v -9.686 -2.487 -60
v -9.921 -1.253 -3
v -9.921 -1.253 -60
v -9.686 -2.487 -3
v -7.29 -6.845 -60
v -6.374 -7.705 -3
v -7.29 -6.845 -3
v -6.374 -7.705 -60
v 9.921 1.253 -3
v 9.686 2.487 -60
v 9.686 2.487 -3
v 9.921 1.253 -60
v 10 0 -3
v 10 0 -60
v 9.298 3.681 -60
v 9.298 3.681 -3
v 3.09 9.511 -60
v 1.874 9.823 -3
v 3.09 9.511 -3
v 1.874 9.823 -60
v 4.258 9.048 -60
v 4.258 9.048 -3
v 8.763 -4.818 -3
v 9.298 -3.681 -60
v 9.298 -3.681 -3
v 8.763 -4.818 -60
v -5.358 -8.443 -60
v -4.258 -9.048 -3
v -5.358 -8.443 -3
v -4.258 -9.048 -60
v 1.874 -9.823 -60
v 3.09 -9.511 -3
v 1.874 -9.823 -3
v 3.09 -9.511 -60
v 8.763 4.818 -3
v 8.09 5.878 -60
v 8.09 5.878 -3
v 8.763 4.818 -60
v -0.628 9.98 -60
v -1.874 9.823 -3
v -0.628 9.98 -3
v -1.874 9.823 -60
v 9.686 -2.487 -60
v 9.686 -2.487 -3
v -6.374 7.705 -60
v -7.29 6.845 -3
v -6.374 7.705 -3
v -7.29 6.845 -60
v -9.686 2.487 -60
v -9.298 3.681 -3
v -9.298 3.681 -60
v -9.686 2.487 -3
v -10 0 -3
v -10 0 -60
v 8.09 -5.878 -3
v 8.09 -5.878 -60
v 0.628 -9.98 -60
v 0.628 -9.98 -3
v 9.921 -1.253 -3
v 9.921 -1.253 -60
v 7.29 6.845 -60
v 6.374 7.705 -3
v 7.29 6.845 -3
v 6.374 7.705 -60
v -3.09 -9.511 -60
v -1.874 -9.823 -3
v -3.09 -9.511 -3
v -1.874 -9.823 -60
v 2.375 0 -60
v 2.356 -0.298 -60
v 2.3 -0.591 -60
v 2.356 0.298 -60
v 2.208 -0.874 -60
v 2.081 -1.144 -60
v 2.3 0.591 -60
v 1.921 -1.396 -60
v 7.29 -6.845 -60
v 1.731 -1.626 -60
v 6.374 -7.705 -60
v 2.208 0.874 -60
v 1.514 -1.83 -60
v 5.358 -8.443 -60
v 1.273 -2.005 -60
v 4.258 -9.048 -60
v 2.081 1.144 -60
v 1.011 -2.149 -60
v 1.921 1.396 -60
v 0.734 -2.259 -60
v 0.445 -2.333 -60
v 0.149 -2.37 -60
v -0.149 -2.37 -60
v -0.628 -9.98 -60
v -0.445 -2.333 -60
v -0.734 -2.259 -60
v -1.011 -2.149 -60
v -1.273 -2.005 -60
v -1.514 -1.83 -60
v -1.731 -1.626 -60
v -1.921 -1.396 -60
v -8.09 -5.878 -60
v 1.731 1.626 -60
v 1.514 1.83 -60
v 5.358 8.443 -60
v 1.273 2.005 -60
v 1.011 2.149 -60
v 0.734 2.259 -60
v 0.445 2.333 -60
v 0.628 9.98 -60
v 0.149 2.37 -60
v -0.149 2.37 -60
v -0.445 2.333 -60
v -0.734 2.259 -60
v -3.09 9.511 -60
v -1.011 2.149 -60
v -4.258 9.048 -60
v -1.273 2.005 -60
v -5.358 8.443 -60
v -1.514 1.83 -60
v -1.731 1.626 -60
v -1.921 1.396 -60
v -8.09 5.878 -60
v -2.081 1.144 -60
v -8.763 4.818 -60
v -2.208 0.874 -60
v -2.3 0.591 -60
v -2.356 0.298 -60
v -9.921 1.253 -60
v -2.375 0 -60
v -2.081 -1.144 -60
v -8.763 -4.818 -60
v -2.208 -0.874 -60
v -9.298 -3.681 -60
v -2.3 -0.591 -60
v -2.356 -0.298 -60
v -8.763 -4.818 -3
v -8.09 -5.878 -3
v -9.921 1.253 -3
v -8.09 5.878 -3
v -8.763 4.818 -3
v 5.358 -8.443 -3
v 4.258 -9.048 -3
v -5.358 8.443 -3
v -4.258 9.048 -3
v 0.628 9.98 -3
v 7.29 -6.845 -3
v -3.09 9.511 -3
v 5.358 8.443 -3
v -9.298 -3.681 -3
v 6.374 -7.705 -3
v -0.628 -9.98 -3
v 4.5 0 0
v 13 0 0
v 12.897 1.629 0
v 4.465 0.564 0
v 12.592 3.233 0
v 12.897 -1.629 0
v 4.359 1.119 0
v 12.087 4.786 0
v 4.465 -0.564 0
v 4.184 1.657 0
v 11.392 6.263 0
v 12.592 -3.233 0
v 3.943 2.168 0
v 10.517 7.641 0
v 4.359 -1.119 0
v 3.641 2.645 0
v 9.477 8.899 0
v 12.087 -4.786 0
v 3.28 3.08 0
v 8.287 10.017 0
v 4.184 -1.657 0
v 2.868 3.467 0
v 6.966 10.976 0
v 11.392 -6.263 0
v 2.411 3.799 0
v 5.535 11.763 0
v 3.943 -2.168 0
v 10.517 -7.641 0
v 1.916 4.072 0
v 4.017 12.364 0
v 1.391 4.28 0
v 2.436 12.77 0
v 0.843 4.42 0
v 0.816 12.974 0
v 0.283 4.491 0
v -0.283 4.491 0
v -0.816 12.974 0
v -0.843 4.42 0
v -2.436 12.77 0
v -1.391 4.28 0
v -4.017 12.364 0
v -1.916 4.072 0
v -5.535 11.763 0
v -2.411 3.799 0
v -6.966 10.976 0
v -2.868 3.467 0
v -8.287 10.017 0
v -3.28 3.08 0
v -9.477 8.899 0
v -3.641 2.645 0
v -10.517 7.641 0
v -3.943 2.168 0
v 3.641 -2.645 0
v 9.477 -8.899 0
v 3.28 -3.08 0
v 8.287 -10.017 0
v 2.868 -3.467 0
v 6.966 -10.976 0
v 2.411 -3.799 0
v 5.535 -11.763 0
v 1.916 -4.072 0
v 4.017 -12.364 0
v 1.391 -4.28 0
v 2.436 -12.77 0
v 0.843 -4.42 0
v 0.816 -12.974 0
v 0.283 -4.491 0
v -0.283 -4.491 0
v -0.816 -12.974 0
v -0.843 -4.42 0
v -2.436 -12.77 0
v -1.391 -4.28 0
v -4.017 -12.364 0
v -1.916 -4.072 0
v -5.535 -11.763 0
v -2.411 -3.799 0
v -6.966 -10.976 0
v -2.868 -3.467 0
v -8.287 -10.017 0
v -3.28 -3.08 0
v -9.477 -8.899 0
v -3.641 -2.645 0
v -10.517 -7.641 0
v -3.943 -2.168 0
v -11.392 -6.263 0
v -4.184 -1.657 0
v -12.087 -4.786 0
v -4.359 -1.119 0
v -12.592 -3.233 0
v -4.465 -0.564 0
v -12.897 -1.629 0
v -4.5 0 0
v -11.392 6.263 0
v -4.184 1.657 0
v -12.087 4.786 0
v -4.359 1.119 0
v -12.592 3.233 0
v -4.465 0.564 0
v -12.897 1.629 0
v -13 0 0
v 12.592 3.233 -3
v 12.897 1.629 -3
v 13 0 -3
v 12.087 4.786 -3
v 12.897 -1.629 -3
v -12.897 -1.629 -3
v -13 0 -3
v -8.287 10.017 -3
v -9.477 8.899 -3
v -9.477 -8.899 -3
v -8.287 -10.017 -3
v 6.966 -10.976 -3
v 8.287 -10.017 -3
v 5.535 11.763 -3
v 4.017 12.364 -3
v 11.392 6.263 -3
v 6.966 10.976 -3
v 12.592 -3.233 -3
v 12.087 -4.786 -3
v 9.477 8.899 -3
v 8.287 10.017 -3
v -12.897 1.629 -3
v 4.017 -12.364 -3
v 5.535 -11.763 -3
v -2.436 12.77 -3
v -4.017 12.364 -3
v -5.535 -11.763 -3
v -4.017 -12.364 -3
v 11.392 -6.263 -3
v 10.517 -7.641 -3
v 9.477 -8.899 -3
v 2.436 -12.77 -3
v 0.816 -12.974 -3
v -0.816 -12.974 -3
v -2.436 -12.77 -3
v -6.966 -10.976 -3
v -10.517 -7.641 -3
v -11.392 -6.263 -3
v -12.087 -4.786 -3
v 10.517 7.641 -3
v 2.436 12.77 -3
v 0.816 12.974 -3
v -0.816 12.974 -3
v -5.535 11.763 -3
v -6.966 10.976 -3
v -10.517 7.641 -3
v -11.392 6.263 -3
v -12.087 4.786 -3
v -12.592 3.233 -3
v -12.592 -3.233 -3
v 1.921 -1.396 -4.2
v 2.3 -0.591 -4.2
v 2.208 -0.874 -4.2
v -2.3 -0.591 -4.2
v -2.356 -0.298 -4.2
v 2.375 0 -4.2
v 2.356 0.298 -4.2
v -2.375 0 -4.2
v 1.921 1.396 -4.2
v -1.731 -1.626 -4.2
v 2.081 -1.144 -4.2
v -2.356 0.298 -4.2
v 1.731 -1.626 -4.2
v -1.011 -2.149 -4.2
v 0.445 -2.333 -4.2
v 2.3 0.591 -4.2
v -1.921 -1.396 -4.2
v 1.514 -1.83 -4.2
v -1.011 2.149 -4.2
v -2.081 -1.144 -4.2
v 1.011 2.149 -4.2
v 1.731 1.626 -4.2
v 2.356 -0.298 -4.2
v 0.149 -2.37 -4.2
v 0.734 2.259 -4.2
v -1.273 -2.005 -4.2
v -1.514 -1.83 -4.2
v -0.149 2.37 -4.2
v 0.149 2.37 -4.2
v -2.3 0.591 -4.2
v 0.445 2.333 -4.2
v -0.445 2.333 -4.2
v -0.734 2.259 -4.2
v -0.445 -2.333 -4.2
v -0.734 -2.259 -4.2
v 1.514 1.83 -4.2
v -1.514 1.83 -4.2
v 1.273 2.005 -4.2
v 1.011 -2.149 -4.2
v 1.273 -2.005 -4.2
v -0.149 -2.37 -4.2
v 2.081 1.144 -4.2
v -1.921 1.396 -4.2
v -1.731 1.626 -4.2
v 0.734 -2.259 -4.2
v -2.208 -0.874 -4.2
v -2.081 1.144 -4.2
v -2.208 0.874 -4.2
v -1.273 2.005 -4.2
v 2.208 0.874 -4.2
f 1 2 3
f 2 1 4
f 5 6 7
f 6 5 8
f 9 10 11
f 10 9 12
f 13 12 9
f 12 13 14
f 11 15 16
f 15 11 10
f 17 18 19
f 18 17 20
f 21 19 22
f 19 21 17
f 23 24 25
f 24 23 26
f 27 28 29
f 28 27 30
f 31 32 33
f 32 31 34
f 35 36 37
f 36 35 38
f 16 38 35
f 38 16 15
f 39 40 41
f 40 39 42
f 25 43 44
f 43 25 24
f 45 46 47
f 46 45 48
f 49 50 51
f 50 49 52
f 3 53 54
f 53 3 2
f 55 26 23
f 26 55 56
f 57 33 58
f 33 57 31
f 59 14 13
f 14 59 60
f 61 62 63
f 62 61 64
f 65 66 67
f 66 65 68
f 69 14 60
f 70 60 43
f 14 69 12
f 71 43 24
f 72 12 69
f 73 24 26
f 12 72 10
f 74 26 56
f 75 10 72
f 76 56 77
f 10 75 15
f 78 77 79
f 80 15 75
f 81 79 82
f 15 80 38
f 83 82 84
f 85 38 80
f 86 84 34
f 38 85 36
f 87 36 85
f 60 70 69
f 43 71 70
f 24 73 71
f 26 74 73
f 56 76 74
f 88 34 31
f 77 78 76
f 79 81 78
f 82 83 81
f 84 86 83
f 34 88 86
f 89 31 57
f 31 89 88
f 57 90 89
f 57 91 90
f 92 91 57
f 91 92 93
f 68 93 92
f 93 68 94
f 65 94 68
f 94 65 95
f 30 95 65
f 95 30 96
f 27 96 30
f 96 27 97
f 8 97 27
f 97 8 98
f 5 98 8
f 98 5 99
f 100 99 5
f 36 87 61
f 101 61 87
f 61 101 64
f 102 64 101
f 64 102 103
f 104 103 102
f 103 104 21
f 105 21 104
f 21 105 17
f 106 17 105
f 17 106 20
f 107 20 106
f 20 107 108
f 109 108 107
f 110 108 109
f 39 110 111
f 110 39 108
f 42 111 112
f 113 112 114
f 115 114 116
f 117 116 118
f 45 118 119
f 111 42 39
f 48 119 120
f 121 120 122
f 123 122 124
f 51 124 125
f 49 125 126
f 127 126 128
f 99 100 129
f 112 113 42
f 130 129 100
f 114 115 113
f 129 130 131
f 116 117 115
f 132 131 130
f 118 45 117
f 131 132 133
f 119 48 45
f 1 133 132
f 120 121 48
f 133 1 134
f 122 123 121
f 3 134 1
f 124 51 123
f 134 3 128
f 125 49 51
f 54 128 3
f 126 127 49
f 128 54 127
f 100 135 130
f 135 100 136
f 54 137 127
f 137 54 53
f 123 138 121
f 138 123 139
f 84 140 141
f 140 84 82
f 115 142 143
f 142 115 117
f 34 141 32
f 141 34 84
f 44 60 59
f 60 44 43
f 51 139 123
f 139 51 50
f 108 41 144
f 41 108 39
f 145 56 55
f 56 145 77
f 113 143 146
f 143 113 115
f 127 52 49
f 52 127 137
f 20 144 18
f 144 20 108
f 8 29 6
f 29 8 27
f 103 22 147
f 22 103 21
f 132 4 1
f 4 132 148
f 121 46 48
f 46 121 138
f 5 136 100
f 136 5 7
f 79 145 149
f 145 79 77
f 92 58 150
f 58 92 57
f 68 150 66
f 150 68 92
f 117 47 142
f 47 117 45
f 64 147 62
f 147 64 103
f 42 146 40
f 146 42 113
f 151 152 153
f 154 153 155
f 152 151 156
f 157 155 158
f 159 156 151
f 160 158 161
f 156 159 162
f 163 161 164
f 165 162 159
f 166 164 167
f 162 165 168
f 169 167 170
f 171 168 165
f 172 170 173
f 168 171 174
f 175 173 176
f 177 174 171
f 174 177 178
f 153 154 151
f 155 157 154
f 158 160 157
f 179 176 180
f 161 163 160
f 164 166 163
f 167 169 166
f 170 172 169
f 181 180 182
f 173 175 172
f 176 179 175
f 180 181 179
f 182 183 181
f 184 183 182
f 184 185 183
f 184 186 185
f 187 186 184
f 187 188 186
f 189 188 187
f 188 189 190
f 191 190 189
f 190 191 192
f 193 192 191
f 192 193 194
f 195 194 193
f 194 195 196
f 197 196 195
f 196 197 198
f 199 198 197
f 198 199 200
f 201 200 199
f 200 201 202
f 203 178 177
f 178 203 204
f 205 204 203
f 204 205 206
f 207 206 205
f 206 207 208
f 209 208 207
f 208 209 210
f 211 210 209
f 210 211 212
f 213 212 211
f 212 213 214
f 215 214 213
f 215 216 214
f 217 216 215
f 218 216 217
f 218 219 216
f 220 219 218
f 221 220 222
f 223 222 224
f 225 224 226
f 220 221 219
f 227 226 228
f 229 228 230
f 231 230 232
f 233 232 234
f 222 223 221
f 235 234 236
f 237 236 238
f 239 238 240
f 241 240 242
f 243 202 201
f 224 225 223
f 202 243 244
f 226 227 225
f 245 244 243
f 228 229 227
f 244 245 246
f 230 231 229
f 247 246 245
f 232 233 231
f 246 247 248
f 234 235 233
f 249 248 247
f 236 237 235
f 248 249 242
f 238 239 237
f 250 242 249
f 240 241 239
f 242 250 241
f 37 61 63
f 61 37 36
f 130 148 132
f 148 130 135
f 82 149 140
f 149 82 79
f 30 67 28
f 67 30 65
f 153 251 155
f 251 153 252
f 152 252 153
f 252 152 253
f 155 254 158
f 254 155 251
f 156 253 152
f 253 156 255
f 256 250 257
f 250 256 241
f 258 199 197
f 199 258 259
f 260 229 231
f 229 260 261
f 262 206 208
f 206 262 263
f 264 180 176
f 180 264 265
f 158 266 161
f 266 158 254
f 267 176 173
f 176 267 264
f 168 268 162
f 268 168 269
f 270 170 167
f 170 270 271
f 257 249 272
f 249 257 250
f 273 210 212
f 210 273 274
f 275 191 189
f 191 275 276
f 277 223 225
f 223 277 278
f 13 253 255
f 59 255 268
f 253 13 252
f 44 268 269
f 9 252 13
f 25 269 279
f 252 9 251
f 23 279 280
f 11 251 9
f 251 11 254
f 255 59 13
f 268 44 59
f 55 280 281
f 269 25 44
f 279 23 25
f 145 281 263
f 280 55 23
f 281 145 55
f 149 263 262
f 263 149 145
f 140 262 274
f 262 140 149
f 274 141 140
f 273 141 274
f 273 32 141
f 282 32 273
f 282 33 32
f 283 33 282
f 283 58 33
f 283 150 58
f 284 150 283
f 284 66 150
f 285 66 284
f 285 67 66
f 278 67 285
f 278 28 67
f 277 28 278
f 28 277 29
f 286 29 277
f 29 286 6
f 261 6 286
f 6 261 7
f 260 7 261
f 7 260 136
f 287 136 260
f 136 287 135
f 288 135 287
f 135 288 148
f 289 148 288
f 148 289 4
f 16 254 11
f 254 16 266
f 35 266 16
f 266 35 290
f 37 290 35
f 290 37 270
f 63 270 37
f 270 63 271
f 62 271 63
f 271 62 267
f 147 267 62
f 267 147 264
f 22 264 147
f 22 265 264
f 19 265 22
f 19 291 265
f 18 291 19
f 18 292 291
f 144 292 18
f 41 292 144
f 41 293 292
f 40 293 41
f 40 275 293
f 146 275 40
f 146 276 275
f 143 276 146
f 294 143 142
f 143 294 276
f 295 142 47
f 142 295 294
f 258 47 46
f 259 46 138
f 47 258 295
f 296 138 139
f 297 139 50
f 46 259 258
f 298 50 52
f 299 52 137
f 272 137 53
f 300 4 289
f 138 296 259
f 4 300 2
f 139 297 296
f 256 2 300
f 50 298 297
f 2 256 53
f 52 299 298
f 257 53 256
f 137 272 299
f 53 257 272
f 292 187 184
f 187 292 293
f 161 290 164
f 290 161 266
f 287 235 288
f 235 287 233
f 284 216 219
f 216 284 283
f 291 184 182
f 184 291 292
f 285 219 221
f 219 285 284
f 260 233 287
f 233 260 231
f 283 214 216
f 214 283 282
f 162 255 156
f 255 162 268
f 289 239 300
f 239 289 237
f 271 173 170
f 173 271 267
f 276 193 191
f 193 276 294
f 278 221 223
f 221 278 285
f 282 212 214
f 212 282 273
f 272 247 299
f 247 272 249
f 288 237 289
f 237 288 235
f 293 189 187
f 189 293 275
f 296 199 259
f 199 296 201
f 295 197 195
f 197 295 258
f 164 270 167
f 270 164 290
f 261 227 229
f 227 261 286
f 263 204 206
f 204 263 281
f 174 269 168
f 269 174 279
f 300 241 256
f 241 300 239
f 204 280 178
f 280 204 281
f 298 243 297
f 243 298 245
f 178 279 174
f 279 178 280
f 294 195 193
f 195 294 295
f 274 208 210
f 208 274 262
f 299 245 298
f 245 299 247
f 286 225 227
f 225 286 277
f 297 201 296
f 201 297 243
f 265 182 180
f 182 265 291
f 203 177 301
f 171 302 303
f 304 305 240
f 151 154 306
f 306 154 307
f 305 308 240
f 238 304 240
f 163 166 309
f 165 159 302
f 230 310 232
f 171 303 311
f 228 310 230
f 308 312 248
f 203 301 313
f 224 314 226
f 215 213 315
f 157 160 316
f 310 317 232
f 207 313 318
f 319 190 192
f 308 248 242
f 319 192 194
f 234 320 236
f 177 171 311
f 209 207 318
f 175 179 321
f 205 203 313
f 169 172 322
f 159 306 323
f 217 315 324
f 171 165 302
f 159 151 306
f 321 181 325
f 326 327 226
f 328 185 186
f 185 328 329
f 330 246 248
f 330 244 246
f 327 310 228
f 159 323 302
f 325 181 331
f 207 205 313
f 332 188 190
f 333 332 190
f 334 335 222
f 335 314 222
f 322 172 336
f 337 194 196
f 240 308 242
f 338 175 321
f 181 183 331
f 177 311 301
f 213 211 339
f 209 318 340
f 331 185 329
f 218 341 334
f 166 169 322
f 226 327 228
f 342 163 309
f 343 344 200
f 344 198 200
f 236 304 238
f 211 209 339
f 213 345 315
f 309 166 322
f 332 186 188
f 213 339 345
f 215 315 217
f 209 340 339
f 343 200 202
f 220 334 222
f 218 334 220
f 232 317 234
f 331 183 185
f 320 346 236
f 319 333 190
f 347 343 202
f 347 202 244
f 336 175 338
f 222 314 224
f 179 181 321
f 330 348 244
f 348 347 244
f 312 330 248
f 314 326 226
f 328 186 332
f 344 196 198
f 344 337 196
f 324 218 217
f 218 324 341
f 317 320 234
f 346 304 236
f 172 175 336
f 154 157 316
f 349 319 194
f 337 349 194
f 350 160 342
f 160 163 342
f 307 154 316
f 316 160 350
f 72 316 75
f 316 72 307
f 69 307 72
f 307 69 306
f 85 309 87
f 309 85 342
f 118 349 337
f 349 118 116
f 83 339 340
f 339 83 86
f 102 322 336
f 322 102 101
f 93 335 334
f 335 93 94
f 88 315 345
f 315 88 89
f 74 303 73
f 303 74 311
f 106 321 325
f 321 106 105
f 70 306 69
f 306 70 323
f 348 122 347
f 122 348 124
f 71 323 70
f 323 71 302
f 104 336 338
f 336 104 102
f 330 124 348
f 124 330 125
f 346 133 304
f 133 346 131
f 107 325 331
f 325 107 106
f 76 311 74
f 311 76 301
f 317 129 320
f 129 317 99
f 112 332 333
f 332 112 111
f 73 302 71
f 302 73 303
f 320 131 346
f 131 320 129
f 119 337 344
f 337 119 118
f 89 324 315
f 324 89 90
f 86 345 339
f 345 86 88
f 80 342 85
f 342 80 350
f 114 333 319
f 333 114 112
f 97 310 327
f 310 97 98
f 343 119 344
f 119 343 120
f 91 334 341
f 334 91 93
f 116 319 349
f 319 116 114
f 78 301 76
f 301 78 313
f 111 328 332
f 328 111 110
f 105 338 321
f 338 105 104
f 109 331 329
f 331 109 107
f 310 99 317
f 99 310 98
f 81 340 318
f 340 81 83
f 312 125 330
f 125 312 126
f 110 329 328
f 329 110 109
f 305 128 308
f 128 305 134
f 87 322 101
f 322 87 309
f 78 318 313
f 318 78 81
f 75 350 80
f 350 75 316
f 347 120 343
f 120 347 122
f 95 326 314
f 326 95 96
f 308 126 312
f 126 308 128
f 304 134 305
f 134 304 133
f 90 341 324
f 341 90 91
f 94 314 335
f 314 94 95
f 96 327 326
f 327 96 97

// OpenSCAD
$fn = 50;


difference() {
	union() {
		translate(v = [0, 0, -60.0000000000]) {
			cylinder(h = 60, r = 10.0000000000);
		}
		translate(v = [0, 0, -3.0000000000]) {
			cylinder(h = 3, r = 13.0000000000);
		}
	}
	union() {
		translate(v = [0, 0, 0]) {
			rotate(a = [0, 0, 0]) {
				difference() {
					union() {
						#translate(v = [0, 0, -60.0000000000]) {
							cylinder(h = 60, r = 2.2500000000);
						}
						#translate(v = [0, 0, -4.2000000000]) {
							cylinder(h = 4.2000000000, r = 10.0000000000, r1 = 2.3750000000, r2 = 4.5000000000);
						}
						#translate(v = [0, 0, -60.0000000000]) {
							cylinder(h = 60, r = 2.3750000000);
						}
						#translate(v = [0, 0, -60.0000000000]) {
							cylinder(h = 60, r = 2.2500000000);
						}
					}
					union();
				}
			}
		}
	}
}
